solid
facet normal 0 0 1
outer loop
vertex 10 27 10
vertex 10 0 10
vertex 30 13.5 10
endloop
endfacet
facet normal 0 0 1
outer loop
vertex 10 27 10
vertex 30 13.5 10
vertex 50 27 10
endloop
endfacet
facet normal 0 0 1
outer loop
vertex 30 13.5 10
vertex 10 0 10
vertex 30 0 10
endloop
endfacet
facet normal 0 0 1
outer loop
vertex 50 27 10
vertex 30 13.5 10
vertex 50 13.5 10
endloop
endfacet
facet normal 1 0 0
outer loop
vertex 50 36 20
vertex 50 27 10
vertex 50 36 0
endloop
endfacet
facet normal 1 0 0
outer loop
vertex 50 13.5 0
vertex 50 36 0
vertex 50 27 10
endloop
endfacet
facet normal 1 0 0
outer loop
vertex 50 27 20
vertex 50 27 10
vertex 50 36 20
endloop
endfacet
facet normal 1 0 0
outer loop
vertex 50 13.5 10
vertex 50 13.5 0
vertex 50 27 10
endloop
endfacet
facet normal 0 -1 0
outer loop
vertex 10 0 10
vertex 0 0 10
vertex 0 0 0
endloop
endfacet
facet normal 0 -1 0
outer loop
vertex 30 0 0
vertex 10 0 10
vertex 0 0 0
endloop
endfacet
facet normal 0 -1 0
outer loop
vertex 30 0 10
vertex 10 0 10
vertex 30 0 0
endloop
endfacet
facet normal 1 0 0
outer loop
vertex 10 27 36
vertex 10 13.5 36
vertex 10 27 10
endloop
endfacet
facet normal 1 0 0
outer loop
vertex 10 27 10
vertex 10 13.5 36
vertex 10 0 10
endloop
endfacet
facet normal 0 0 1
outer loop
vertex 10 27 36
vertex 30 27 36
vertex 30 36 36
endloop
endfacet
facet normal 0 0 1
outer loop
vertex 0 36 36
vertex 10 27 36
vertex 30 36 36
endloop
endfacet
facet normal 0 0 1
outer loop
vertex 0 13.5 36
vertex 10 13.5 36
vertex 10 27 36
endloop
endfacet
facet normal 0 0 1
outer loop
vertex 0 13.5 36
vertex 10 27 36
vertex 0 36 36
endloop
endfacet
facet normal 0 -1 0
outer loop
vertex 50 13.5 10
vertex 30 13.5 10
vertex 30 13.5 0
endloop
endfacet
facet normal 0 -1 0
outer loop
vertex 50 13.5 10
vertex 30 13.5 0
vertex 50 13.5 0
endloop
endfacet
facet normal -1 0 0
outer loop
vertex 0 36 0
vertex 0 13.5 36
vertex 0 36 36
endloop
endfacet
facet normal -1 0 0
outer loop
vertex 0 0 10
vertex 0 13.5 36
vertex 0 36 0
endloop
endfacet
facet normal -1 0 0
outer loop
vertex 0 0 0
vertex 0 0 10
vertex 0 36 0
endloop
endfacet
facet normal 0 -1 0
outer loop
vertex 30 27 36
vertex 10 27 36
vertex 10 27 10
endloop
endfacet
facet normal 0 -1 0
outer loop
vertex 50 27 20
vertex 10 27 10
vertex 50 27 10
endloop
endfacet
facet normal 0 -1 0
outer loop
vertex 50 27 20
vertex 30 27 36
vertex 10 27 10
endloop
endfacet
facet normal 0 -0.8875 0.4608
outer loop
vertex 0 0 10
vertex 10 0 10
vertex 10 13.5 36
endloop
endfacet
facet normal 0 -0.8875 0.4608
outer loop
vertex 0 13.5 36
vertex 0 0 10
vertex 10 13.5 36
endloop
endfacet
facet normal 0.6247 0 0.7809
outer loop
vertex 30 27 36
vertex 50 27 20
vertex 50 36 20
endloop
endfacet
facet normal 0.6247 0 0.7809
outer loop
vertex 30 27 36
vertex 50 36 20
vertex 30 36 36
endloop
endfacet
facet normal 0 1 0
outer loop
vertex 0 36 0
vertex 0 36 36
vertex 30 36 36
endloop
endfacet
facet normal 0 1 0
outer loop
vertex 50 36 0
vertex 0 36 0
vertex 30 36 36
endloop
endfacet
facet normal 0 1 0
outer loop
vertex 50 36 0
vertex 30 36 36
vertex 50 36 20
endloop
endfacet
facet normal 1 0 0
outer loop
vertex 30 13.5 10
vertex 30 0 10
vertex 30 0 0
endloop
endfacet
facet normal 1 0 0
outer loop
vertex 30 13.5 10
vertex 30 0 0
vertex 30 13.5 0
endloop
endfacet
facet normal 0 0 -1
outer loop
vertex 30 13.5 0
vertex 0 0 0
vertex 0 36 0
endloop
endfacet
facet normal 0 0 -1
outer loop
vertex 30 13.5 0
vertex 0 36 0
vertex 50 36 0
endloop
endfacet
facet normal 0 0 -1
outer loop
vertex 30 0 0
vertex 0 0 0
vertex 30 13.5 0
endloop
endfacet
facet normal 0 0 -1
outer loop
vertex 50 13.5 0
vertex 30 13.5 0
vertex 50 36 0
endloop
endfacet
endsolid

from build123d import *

# Parameters (mm, degrees)
F1_DEPTH = 36
F2_DEPTH = 27
F4_DEPTH = 10.001
F5_W     = 20
F5_H     = 13.5
F6_DEPTH = 10.001


with BuildPart() as f1:
    # F0 (on Front) → F1 (new body)
    with BuildSketch(Plane.XZ):
        Polygon((0, 36), (0, 0), (50, 0), (50, 10), (10, 10), (10, 36), align=None)
        Polygon((10, 10), (50, 10), (50, 20), (30, 36), (10, 36), align=None)
    extrude(amount=-F1_DEPTH)

    # F0 (on Front) → F2 (cut)
    with BuildSketch(Plane.XZ):
        Polygon((10, 10), (50, 10), (50, 20), (30, 36), (10, 36), align=None)
    extrude(amount=-F2_DEPTH, mode=Mode.SUBTRACT)

    # F3 (on face) → F4 (cut, through all)
    with BuildSketch(Plane.YZ.offset(10)):
        Polygon((0, 10), (13.5, 36), (0, 36), align=None)
    extrude(amount=-F4_DEPTH, mode=Mode.SUBTRACT)

    # F5 (on face) → F6 (cut, through all)
    with BuildSketch(Plane.XY.offset(10)):
        with Locations((40, 6.75)):
            Rectangle(F5_W, F5_H)
    extrude(amount=-F6_DEPTH, mode=Mode.SUBTRACT)


solid = f1.part
